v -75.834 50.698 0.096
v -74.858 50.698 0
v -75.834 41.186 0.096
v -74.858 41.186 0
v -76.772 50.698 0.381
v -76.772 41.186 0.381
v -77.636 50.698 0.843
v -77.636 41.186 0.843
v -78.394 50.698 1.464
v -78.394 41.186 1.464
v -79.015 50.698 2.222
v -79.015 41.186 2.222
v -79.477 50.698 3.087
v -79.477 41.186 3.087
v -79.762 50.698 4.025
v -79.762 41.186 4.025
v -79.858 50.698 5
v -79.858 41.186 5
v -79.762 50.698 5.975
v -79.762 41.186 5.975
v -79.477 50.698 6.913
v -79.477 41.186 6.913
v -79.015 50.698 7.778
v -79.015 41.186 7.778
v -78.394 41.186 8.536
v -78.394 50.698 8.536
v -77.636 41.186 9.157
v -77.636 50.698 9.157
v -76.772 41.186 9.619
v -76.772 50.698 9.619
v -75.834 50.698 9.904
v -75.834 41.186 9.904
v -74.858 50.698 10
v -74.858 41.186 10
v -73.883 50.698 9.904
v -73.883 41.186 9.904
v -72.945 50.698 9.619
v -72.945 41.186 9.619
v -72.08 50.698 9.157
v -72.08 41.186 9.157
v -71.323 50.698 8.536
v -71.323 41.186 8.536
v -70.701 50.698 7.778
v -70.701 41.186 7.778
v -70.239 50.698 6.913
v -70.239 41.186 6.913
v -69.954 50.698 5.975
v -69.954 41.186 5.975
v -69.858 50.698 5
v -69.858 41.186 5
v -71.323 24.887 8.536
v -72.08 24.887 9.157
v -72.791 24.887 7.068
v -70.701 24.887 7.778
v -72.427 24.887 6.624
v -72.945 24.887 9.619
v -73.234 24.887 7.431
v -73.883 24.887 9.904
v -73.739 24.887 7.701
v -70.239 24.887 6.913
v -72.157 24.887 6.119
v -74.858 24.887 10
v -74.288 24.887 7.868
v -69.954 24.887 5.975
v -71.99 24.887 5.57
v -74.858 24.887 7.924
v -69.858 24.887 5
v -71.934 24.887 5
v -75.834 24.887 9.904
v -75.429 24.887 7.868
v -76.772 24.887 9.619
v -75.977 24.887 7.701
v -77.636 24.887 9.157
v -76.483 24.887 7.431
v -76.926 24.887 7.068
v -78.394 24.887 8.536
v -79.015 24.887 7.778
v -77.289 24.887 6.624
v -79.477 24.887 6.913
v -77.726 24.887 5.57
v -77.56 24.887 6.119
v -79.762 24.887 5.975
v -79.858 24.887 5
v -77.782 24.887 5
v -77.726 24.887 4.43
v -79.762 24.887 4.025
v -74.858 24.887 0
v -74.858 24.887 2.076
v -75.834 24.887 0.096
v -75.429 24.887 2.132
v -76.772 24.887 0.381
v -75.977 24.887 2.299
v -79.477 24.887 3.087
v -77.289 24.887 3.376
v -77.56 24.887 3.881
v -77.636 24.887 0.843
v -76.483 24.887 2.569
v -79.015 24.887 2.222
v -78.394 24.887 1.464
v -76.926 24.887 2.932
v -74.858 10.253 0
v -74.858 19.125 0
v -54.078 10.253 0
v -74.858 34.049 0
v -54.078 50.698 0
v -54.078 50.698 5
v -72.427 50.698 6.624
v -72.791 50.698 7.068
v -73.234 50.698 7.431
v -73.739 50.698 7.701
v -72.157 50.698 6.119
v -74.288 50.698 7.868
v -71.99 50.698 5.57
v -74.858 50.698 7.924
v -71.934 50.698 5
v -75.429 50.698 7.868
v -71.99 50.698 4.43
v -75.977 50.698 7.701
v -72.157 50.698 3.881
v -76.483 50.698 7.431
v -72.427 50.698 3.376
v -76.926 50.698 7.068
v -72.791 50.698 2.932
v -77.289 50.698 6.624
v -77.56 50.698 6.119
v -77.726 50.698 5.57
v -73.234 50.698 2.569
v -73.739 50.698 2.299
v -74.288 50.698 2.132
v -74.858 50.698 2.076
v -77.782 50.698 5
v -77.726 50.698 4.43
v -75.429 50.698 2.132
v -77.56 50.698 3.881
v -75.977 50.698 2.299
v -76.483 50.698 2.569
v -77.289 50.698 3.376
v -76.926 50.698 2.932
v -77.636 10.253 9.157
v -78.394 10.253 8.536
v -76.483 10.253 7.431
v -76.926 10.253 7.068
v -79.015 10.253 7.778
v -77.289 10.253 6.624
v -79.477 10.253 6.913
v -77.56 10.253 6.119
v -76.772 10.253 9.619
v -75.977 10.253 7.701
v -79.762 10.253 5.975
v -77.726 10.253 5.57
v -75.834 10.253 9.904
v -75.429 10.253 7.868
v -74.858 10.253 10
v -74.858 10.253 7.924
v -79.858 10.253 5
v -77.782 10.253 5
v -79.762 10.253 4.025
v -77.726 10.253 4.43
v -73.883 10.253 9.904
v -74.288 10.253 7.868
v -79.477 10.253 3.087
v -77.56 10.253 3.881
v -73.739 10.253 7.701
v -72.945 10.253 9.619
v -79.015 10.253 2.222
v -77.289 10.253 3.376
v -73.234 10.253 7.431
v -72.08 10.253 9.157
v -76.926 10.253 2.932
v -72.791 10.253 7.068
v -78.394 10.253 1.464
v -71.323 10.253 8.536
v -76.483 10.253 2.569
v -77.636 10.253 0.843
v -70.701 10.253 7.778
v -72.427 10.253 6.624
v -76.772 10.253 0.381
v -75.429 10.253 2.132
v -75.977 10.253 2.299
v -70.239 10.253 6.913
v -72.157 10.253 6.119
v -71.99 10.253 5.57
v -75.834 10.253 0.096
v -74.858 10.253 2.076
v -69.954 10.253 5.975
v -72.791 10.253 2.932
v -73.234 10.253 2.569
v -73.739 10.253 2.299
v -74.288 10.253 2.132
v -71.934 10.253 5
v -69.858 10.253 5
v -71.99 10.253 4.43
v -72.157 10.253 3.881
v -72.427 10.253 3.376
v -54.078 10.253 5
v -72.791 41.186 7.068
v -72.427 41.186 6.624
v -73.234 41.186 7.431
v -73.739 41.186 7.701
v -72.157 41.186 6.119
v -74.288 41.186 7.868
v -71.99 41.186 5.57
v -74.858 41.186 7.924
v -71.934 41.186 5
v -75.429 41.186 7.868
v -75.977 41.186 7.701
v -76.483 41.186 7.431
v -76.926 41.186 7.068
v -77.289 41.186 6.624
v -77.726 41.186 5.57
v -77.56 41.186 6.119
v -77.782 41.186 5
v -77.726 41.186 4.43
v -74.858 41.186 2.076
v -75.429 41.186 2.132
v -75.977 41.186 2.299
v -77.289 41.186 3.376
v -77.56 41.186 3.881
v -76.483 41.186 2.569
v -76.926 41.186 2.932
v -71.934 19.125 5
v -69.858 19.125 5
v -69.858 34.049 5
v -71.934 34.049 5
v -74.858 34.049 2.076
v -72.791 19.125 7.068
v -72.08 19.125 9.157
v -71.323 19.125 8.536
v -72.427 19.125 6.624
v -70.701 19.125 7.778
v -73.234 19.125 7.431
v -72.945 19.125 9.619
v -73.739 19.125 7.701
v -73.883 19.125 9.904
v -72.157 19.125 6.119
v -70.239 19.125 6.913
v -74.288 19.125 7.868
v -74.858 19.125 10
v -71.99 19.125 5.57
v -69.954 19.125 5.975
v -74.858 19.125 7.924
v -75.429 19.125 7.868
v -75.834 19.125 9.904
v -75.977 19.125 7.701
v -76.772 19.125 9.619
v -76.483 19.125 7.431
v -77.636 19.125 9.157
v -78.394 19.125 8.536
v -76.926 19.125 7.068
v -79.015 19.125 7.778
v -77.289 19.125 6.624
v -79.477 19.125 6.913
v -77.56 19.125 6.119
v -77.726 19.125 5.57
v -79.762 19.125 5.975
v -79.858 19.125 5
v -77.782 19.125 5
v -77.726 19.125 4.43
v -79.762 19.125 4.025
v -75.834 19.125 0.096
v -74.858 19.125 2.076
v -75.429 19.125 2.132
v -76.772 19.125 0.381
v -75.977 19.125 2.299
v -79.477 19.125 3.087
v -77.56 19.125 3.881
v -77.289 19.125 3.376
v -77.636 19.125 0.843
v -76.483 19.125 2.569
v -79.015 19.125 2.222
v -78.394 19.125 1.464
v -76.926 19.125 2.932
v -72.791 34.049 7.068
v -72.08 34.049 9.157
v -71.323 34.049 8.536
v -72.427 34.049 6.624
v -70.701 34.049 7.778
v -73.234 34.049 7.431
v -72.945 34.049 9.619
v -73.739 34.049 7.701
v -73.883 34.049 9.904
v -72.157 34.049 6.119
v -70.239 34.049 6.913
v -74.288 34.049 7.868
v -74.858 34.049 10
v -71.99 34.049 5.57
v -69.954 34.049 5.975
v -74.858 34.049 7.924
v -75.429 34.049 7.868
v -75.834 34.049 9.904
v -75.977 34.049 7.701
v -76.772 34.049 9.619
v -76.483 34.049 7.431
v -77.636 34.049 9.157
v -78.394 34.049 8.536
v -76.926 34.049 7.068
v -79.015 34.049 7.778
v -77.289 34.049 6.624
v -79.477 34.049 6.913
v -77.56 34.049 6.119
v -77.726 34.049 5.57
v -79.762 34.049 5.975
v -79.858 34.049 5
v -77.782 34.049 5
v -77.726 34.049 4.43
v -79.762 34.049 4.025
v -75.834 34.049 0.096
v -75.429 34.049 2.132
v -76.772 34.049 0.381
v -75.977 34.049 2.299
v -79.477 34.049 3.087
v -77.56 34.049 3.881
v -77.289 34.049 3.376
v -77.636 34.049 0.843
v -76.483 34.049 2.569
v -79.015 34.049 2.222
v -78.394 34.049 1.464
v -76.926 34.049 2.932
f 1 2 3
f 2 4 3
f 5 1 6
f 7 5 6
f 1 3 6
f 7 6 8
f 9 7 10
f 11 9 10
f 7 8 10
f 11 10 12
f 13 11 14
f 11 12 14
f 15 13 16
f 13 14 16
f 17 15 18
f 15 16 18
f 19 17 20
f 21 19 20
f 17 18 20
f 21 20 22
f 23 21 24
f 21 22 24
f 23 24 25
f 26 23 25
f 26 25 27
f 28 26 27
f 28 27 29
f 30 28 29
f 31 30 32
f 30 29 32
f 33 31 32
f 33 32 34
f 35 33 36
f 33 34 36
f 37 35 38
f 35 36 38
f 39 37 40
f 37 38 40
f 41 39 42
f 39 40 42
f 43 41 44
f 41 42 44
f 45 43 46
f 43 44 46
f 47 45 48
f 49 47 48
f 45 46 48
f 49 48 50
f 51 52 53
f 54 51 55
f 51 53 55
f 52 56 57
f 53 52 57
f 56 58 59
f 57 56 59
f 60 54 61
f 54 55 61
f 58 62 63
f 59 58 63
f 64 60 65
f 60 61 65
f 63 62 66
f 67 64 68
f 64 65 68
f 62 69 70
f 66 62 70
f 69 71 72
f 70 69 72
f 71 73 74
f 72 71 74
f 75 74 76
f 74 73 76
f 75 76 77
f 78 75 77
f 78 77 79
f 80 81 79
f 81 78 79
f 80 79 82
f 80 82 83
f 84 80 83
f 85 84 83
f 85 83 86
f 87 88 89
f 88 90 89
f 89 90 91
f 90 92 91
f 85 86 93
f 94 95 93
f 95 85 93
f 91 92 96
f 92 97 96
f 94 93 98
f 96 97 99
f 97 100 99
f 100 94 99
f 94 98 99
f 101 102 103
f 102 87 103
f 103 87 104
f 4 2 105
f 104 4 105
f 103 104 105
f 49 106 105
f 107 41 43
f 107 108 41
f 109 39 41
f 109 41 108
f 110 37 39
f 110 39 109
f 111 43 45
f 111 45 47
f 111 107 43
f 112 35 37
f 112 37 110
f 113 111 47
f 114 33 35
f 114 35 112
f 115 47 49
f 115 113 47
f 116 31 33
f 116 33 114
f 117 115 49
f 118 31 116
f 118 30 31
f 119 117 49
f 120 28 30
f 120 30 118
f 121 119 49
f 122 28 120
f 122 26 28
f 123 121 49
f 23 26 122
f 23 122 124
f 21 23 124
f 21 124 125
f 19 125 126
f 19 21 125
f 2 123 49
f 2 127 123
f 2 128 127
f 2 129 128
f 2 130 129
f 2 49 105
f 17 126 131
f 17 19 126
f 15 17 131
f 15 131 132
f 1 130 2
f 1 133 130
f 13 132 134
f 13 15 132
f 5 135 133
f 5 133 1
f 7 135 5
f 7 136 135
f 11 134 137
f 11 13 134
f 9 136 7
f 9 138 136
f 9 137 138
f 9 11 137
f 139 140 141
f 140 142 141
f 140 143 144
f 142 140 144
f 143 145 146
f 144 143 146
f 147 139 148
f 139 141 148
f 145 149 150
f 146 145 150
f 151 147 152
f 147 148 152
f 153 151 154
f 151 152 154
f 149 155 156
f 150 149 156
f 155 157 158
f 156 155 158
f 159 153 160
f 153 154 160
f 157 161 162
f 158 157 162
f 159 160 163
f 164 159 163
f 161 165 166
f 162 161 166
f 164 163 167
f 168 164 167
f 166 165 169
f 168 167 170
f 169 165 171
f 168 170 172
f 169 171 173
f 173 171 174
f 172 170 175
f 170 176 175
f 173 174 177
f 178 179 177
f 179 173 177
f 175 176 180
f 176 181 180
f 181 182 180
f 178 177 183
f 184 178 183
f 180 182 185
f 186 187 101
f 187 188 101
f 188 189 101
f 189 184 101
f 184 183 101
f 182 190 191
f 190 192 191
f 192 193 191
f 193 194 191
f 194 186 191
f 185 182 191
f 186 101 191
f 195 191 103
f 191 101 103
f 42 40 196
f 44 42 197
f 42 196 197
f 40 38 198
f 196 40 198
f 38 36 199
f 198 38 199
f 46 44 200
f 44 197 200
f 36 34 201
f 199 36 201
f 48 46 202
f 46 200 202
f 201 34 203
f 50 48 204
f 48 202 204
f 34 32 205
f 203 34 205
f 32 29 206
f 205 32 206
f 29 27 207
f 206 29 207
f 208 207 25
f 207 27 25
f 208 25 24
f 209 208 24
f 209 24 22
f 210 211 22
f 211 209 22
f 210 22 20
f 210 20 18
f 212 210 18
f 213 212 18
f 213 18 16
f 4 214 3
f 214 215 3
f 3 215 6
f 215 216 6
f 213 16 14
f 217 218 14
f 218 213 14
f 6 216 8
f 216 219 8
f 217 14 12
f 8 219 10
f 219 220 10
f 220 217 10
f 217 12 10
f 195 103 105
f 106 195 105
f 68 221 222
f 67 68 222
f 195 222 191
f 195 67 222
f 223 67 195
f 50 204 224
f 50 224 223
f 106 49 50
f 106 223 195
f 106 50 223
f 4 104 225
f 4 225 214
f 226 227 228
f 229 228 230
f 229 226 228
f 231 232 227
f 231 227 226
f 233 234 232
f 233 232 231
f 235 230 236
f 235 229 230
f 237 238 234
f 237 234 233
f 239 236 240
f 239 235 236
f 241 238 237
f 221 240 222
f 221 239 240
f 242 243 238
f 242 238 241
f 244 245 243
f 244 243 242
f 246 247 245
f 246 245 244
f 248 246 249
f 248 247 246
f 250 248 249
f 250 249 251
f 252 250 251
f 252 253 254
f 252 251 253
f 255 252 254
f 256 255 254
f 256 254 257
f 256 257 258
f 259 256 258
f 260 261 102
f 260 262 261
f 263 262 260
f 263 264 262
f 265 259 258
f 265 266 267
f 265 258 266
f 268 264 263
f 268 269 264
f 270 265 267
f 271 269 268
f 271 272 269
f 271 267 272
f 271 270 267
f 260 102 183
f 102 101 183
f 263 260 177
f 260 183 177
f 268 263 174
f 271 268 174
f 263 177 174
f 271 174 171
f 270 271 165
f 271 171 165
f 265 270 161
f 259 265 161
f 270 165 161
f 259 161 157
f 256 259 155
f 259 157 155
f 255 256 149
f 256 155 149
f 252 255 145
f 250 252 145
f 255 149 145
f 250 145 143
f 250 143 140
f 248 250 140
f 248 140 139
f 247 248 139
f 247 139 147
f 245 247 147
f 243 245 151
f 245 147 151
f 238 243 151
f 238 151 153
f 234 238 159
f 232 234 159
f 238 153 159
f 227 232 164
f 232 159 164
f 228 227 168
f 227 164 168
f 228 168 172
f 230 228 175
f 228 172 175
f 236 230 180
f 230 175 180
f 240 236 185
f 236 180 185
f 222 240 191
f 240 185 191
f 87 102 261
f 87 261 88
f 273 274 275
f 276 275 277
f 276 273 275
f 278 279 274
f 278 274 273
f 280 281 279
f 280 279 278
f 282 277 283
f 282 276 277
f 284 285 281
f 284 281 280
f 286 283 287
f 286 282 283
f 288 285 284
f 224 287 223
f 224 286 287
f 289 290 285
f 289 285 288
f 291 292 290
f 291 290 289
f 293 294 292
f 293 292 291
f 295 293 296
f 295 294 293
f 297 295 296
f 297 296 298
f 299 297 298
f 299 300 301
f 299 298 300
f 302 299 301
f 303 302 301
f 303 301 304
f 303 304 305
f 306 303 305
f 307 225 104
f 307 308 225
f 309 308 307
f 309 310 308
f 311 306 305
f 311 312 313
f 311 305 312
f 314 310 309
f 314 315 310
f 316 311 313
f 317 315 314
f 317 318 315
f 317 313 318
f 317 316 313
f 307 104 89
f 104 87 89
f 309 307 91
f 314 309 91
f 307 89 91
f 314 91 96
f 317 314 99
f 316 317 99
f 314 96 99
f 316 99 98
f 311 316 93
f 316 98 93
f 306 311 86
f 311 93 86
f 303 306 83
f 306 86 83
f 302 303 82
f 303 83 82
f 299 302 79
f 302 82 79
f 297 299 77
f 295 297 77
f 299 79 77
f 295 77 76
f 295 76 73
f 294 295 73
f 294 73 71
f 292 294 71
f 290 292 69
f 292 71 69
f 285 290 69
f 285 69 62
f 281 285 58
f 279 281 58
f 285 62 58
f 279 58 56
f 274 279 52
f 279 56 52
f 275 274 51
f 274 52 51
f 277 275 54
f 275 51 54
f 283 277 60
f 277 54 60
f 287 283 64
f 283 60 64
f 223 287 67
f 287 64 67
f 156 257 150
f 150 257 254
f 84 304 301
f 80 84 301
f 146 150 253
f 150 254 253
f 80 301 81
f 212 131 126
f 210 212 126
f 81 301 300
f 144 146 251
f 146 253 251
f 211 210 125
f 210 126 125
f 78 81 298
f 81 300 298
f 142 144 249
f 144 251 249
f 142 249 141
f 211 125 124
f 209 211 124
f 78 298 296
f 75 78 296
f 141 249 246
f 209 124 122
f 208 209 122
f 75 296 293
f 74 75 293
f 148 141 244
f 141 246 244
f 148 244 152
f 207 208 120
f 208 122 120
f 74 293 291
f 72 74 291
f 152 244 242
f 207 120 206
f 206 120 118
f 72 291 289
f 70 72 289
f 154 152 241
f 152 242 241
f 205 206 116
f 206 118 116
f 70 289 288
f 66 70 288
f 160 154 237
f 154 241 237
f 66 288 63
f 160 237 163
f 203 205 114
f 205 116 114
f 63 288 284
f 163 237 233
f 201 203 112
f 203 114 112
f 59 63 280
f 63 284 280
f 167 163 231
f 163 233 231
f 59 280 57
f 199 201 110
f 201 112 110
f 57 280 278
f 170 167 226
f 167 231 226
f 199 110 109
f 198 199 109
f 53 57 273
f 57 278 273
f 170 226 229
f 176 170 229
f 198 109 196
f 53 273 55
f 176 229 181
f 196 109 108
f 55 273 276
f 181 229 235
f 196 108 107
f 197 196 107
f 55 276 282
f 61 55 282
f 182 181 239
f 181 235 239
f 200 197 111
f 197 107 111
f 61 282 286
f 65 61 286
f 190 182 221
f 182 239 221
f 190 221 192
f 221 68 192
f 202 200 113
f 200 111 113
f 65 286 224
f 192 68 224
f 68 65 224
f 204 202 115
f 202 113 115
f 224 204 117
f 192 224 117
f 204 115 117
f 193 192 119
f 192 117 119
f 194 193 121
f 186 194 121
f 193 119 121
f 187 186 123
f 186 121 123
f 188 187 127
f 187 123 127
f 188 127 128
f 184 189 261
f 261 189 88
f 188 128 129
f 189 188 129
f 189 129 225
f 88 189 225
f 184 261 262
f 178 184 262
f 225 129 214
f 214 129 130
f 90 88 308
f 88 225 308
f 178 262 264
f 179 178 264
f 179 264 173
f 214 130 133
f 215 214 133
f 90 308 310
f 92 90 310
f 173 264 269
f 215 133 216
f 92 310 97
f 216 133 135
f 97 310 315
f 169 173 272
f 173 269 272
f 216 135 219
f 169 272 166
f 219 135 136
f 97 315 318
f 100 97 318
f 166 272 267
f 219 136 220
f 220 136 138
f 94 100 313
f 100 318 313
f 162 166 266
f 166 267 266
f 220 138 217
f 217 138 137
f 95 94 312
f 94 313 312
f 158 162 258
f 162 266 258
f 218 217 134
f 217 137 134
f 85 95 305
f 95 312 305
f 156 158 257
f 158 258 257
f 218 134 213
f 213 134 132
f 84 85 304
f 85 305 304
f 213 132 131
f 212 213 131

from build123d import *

# Parameters (mm, degrees)
F0_W     = 20.7803882658
F0_H     = 40.445305407
F1_DEPTH = 5
F2_W     = 9.5119066536
F2_H     = 5
F2_W_2   = 9.1619901359
F2_W_3   = 8.8719539344
F3_ANGLE = 270
F4_R     = 2.9239984628
F5_DEPTH = 100


with BuildPart() as f1:
    # F0 (on Top) → F1 (new body)
    with BuildSketch(Plane.XY):
        with Locations((-64.4678976387, 30.4752923548)):
            Rectangle(F0_W, F0_H)
    extrude(amount=F1_DEPTH)

    # F2 (on face) → F3 (revolve)
    with BuildSketch(Plane(origin=(-74.8580917716, 0, 0), x_dir=(0, -1, 0), z_dir=(-1, 0, 0))):
        with Locations((-45.9419917315, 2.5)):
            Rectangle(F2_W, F2_H)
        with Locations((-29.4675175101, 2.5)):
            Rectangle(F2_W_2, F2_H)
        with Locations((-14.6886166185, 2.5)):
            Rectangle(F2_W_3, F2_H)
    revolve(axis=Axis((-74.8580917716, 28.935774928, 5), (0, 1, 0)), revolution_arc=F3_ANGLE)

    # F4 (on face) → F5 (cut)
    with BuildSketch(Plane(origin=(0, 50.6979450583, 0), x_dir=(-1, 0, 0), z_dir=(0, 1, 0))):
        with Locations((74.8580917716, 5)):
            Circle(F4_R)
    extrude(amount=-F5_DEPTH, mode=Mode.SUBTRACT)


solid = f1.part
